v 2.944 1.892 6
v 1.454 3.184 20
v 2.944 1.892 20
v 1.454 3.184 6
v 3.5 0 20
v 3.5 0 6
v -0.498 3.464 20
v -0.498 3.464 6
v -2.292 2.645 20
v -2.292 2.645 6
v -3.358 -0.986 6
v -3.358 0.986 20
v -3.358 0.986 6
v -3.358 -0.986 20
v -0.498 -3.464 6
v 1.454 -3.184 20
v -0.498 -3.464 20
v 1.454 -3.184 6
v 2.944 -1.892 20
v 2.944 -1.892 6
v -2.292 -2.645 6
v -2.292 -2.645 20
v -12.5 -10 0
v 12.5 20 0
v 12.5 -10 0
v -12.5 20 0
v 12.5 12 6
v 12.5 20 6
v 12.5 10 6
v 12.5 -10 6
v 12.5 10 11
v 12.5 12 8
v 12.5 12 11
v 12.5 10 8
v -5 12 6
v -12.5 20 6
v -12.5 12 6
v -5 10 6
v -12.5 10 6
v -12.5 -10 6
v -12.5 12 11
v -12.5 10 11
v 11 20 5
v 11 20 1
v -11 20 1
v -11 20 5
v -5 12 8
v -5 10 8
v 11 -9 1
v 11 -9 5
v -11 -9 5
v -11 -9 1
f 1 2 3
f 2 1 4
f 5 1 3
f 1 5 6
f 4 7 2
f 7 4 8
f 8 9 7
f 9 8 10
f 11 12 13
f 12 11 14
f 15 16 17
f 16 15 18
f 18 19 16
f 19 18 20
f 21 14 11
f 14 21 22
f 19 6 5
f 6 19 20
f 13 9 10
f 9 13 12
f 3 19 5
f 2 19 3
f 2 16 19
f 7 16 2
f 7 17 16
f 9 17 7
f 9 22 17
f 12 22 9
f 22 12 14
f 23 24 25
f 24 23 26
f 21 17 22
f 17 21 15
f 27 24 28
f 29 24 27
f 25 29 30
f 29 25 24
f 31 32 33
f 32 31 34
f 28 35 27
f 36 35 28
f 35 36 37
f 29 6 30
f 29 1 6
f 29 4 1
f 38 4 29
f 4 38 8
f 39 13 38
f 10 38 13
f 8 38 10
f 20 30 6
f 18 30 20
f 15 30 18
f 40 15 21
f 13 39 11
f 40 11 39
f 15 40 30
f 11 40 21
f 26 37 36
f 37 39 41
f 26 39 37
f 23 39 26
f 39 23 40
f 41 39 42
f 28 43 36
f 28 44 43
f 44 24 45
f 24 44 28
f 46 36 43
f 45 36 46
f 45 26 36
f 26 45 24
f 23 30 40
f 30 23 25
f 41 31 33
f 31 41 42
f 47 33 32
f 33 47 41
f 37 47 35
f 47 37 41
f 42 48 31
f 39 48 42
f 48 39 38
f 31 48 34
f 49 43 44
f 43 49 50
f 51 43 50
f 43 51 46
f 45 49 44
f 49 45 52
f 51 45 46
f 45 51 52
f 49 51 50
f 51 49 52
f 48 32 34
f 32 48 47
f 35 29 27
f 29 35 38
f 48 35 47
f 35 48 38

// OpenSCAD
difference()
{
    union()
    {
        cylinder(r=3.5,h=20);
        translate([-12.5,-10,0])cube([25,30,6]);
        translate([-12.5,10,6])cube([25,2,5]);
    }
    translate([-11,-9,1])cube([22,30,4]);
    translate([-5,10,6])cube([18,2,2]);
}
